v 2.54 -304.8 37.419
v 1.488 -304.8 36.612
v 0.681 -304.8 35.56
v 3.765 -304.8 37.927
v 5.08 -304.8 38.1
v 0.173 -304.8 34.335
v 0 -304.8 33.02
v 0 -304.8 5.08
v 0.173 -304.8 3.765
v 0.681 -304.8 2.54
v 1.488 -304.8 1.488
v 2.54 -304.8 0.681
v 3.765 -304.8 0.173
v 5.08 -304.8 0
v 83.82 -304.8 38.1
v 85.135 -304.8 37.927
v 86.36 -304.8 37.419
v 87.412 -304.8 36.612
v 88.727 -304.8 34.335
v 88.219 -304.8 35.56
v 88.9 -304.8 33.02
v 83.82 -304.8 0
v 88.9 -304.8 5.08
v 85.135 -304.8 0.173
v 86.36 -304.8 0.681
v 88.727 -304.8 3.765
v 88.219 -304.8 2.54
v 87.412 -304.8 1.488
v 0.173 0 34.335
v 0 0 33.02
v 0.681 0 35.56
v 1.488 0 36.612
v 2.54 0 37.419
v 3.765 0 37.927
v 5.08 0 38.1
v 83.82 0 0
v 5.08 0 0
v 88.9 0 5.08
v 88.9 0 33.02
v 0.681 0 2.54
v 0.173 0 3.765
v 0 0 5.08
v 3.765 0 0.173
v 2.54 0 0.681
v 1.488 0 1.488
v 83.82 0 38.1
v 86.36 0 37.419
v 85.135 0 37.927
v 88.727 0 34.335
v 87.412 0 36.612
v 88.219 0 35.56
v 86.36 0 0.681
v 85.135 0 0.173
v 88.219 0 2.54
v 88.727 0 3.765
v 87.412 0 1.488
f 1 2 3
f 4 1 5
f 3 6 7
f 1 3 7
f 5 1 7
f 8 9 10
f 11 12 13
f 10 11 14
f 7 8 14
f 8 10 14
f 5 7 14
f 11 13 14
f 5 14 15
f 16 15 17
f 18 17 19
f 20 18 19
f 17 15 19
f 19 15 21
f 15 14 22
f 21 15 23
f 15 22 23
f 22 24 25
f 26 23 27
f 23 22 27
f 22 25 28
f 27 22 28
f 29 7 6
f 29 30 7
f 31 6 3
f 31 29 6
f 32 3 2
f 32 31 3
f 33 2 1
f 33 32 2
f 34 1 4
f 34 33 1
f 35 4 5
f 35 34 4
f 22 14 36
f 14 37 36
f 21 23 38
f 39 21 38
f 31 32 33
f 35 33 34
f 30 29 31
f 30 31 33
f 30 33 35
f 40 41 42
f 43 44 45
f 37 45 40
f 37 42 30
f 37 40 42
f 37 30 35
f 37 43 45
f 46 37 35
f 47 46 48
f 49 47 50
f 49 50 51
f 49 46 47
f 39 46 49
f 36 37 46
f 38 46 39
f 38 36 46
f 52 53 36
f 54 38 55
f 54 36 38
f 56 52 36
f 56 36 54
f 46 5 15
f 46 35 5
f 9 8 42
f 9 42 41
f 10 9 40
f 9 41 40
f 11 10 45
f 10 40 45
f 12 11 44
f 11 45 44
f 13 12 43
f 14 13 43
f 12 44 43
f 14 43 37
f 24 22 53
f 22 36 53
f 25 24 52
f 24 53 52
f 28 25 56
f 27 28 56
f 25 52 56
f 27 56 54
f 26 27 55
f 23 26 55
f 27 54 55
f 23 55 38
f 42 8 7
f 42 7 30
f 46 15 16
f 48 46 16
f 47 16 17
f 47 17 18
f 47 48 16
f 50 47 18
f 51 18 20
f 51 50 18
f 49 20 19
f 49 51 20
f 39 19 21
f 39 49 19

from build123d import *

# Parameters (mm, degrees)
F0_W     = 88.9
F0_H     = 304.8
F1_DEPTH = 38.1
F2_R     = 5.08
F3_R     = 5.08


# Not quite as in the source:
# - a feature names something its author has since deleted; it is built from what else it names


with BuildPart() as f1:
    # F0 (on Top) → F1 (new body)
    with BuildSketch(Plane.XY):
        with Locations((44.45, -152.4)):
            Rectangle(F0_W, F0_H)
    extrude(amount=F1_DEPTH)

    # F2
    f2_edges = [f1.edges().sort_by_distance(p)[0] for p in [
        (0, -152.4, 38.1),
        (0, -152.4, 0),
    ]]
    fillet(f2_edges, radius=F2_R)

    # F3
    f3_edges = [f1.edges().sort_by_distance(p)[0] for p in [
        (88.9, -152.4, 38.1),
        (88.9, -152.4, 0),
    ]]
    fillet(f3_edges, radius=F3_R)


solid = f1.part
